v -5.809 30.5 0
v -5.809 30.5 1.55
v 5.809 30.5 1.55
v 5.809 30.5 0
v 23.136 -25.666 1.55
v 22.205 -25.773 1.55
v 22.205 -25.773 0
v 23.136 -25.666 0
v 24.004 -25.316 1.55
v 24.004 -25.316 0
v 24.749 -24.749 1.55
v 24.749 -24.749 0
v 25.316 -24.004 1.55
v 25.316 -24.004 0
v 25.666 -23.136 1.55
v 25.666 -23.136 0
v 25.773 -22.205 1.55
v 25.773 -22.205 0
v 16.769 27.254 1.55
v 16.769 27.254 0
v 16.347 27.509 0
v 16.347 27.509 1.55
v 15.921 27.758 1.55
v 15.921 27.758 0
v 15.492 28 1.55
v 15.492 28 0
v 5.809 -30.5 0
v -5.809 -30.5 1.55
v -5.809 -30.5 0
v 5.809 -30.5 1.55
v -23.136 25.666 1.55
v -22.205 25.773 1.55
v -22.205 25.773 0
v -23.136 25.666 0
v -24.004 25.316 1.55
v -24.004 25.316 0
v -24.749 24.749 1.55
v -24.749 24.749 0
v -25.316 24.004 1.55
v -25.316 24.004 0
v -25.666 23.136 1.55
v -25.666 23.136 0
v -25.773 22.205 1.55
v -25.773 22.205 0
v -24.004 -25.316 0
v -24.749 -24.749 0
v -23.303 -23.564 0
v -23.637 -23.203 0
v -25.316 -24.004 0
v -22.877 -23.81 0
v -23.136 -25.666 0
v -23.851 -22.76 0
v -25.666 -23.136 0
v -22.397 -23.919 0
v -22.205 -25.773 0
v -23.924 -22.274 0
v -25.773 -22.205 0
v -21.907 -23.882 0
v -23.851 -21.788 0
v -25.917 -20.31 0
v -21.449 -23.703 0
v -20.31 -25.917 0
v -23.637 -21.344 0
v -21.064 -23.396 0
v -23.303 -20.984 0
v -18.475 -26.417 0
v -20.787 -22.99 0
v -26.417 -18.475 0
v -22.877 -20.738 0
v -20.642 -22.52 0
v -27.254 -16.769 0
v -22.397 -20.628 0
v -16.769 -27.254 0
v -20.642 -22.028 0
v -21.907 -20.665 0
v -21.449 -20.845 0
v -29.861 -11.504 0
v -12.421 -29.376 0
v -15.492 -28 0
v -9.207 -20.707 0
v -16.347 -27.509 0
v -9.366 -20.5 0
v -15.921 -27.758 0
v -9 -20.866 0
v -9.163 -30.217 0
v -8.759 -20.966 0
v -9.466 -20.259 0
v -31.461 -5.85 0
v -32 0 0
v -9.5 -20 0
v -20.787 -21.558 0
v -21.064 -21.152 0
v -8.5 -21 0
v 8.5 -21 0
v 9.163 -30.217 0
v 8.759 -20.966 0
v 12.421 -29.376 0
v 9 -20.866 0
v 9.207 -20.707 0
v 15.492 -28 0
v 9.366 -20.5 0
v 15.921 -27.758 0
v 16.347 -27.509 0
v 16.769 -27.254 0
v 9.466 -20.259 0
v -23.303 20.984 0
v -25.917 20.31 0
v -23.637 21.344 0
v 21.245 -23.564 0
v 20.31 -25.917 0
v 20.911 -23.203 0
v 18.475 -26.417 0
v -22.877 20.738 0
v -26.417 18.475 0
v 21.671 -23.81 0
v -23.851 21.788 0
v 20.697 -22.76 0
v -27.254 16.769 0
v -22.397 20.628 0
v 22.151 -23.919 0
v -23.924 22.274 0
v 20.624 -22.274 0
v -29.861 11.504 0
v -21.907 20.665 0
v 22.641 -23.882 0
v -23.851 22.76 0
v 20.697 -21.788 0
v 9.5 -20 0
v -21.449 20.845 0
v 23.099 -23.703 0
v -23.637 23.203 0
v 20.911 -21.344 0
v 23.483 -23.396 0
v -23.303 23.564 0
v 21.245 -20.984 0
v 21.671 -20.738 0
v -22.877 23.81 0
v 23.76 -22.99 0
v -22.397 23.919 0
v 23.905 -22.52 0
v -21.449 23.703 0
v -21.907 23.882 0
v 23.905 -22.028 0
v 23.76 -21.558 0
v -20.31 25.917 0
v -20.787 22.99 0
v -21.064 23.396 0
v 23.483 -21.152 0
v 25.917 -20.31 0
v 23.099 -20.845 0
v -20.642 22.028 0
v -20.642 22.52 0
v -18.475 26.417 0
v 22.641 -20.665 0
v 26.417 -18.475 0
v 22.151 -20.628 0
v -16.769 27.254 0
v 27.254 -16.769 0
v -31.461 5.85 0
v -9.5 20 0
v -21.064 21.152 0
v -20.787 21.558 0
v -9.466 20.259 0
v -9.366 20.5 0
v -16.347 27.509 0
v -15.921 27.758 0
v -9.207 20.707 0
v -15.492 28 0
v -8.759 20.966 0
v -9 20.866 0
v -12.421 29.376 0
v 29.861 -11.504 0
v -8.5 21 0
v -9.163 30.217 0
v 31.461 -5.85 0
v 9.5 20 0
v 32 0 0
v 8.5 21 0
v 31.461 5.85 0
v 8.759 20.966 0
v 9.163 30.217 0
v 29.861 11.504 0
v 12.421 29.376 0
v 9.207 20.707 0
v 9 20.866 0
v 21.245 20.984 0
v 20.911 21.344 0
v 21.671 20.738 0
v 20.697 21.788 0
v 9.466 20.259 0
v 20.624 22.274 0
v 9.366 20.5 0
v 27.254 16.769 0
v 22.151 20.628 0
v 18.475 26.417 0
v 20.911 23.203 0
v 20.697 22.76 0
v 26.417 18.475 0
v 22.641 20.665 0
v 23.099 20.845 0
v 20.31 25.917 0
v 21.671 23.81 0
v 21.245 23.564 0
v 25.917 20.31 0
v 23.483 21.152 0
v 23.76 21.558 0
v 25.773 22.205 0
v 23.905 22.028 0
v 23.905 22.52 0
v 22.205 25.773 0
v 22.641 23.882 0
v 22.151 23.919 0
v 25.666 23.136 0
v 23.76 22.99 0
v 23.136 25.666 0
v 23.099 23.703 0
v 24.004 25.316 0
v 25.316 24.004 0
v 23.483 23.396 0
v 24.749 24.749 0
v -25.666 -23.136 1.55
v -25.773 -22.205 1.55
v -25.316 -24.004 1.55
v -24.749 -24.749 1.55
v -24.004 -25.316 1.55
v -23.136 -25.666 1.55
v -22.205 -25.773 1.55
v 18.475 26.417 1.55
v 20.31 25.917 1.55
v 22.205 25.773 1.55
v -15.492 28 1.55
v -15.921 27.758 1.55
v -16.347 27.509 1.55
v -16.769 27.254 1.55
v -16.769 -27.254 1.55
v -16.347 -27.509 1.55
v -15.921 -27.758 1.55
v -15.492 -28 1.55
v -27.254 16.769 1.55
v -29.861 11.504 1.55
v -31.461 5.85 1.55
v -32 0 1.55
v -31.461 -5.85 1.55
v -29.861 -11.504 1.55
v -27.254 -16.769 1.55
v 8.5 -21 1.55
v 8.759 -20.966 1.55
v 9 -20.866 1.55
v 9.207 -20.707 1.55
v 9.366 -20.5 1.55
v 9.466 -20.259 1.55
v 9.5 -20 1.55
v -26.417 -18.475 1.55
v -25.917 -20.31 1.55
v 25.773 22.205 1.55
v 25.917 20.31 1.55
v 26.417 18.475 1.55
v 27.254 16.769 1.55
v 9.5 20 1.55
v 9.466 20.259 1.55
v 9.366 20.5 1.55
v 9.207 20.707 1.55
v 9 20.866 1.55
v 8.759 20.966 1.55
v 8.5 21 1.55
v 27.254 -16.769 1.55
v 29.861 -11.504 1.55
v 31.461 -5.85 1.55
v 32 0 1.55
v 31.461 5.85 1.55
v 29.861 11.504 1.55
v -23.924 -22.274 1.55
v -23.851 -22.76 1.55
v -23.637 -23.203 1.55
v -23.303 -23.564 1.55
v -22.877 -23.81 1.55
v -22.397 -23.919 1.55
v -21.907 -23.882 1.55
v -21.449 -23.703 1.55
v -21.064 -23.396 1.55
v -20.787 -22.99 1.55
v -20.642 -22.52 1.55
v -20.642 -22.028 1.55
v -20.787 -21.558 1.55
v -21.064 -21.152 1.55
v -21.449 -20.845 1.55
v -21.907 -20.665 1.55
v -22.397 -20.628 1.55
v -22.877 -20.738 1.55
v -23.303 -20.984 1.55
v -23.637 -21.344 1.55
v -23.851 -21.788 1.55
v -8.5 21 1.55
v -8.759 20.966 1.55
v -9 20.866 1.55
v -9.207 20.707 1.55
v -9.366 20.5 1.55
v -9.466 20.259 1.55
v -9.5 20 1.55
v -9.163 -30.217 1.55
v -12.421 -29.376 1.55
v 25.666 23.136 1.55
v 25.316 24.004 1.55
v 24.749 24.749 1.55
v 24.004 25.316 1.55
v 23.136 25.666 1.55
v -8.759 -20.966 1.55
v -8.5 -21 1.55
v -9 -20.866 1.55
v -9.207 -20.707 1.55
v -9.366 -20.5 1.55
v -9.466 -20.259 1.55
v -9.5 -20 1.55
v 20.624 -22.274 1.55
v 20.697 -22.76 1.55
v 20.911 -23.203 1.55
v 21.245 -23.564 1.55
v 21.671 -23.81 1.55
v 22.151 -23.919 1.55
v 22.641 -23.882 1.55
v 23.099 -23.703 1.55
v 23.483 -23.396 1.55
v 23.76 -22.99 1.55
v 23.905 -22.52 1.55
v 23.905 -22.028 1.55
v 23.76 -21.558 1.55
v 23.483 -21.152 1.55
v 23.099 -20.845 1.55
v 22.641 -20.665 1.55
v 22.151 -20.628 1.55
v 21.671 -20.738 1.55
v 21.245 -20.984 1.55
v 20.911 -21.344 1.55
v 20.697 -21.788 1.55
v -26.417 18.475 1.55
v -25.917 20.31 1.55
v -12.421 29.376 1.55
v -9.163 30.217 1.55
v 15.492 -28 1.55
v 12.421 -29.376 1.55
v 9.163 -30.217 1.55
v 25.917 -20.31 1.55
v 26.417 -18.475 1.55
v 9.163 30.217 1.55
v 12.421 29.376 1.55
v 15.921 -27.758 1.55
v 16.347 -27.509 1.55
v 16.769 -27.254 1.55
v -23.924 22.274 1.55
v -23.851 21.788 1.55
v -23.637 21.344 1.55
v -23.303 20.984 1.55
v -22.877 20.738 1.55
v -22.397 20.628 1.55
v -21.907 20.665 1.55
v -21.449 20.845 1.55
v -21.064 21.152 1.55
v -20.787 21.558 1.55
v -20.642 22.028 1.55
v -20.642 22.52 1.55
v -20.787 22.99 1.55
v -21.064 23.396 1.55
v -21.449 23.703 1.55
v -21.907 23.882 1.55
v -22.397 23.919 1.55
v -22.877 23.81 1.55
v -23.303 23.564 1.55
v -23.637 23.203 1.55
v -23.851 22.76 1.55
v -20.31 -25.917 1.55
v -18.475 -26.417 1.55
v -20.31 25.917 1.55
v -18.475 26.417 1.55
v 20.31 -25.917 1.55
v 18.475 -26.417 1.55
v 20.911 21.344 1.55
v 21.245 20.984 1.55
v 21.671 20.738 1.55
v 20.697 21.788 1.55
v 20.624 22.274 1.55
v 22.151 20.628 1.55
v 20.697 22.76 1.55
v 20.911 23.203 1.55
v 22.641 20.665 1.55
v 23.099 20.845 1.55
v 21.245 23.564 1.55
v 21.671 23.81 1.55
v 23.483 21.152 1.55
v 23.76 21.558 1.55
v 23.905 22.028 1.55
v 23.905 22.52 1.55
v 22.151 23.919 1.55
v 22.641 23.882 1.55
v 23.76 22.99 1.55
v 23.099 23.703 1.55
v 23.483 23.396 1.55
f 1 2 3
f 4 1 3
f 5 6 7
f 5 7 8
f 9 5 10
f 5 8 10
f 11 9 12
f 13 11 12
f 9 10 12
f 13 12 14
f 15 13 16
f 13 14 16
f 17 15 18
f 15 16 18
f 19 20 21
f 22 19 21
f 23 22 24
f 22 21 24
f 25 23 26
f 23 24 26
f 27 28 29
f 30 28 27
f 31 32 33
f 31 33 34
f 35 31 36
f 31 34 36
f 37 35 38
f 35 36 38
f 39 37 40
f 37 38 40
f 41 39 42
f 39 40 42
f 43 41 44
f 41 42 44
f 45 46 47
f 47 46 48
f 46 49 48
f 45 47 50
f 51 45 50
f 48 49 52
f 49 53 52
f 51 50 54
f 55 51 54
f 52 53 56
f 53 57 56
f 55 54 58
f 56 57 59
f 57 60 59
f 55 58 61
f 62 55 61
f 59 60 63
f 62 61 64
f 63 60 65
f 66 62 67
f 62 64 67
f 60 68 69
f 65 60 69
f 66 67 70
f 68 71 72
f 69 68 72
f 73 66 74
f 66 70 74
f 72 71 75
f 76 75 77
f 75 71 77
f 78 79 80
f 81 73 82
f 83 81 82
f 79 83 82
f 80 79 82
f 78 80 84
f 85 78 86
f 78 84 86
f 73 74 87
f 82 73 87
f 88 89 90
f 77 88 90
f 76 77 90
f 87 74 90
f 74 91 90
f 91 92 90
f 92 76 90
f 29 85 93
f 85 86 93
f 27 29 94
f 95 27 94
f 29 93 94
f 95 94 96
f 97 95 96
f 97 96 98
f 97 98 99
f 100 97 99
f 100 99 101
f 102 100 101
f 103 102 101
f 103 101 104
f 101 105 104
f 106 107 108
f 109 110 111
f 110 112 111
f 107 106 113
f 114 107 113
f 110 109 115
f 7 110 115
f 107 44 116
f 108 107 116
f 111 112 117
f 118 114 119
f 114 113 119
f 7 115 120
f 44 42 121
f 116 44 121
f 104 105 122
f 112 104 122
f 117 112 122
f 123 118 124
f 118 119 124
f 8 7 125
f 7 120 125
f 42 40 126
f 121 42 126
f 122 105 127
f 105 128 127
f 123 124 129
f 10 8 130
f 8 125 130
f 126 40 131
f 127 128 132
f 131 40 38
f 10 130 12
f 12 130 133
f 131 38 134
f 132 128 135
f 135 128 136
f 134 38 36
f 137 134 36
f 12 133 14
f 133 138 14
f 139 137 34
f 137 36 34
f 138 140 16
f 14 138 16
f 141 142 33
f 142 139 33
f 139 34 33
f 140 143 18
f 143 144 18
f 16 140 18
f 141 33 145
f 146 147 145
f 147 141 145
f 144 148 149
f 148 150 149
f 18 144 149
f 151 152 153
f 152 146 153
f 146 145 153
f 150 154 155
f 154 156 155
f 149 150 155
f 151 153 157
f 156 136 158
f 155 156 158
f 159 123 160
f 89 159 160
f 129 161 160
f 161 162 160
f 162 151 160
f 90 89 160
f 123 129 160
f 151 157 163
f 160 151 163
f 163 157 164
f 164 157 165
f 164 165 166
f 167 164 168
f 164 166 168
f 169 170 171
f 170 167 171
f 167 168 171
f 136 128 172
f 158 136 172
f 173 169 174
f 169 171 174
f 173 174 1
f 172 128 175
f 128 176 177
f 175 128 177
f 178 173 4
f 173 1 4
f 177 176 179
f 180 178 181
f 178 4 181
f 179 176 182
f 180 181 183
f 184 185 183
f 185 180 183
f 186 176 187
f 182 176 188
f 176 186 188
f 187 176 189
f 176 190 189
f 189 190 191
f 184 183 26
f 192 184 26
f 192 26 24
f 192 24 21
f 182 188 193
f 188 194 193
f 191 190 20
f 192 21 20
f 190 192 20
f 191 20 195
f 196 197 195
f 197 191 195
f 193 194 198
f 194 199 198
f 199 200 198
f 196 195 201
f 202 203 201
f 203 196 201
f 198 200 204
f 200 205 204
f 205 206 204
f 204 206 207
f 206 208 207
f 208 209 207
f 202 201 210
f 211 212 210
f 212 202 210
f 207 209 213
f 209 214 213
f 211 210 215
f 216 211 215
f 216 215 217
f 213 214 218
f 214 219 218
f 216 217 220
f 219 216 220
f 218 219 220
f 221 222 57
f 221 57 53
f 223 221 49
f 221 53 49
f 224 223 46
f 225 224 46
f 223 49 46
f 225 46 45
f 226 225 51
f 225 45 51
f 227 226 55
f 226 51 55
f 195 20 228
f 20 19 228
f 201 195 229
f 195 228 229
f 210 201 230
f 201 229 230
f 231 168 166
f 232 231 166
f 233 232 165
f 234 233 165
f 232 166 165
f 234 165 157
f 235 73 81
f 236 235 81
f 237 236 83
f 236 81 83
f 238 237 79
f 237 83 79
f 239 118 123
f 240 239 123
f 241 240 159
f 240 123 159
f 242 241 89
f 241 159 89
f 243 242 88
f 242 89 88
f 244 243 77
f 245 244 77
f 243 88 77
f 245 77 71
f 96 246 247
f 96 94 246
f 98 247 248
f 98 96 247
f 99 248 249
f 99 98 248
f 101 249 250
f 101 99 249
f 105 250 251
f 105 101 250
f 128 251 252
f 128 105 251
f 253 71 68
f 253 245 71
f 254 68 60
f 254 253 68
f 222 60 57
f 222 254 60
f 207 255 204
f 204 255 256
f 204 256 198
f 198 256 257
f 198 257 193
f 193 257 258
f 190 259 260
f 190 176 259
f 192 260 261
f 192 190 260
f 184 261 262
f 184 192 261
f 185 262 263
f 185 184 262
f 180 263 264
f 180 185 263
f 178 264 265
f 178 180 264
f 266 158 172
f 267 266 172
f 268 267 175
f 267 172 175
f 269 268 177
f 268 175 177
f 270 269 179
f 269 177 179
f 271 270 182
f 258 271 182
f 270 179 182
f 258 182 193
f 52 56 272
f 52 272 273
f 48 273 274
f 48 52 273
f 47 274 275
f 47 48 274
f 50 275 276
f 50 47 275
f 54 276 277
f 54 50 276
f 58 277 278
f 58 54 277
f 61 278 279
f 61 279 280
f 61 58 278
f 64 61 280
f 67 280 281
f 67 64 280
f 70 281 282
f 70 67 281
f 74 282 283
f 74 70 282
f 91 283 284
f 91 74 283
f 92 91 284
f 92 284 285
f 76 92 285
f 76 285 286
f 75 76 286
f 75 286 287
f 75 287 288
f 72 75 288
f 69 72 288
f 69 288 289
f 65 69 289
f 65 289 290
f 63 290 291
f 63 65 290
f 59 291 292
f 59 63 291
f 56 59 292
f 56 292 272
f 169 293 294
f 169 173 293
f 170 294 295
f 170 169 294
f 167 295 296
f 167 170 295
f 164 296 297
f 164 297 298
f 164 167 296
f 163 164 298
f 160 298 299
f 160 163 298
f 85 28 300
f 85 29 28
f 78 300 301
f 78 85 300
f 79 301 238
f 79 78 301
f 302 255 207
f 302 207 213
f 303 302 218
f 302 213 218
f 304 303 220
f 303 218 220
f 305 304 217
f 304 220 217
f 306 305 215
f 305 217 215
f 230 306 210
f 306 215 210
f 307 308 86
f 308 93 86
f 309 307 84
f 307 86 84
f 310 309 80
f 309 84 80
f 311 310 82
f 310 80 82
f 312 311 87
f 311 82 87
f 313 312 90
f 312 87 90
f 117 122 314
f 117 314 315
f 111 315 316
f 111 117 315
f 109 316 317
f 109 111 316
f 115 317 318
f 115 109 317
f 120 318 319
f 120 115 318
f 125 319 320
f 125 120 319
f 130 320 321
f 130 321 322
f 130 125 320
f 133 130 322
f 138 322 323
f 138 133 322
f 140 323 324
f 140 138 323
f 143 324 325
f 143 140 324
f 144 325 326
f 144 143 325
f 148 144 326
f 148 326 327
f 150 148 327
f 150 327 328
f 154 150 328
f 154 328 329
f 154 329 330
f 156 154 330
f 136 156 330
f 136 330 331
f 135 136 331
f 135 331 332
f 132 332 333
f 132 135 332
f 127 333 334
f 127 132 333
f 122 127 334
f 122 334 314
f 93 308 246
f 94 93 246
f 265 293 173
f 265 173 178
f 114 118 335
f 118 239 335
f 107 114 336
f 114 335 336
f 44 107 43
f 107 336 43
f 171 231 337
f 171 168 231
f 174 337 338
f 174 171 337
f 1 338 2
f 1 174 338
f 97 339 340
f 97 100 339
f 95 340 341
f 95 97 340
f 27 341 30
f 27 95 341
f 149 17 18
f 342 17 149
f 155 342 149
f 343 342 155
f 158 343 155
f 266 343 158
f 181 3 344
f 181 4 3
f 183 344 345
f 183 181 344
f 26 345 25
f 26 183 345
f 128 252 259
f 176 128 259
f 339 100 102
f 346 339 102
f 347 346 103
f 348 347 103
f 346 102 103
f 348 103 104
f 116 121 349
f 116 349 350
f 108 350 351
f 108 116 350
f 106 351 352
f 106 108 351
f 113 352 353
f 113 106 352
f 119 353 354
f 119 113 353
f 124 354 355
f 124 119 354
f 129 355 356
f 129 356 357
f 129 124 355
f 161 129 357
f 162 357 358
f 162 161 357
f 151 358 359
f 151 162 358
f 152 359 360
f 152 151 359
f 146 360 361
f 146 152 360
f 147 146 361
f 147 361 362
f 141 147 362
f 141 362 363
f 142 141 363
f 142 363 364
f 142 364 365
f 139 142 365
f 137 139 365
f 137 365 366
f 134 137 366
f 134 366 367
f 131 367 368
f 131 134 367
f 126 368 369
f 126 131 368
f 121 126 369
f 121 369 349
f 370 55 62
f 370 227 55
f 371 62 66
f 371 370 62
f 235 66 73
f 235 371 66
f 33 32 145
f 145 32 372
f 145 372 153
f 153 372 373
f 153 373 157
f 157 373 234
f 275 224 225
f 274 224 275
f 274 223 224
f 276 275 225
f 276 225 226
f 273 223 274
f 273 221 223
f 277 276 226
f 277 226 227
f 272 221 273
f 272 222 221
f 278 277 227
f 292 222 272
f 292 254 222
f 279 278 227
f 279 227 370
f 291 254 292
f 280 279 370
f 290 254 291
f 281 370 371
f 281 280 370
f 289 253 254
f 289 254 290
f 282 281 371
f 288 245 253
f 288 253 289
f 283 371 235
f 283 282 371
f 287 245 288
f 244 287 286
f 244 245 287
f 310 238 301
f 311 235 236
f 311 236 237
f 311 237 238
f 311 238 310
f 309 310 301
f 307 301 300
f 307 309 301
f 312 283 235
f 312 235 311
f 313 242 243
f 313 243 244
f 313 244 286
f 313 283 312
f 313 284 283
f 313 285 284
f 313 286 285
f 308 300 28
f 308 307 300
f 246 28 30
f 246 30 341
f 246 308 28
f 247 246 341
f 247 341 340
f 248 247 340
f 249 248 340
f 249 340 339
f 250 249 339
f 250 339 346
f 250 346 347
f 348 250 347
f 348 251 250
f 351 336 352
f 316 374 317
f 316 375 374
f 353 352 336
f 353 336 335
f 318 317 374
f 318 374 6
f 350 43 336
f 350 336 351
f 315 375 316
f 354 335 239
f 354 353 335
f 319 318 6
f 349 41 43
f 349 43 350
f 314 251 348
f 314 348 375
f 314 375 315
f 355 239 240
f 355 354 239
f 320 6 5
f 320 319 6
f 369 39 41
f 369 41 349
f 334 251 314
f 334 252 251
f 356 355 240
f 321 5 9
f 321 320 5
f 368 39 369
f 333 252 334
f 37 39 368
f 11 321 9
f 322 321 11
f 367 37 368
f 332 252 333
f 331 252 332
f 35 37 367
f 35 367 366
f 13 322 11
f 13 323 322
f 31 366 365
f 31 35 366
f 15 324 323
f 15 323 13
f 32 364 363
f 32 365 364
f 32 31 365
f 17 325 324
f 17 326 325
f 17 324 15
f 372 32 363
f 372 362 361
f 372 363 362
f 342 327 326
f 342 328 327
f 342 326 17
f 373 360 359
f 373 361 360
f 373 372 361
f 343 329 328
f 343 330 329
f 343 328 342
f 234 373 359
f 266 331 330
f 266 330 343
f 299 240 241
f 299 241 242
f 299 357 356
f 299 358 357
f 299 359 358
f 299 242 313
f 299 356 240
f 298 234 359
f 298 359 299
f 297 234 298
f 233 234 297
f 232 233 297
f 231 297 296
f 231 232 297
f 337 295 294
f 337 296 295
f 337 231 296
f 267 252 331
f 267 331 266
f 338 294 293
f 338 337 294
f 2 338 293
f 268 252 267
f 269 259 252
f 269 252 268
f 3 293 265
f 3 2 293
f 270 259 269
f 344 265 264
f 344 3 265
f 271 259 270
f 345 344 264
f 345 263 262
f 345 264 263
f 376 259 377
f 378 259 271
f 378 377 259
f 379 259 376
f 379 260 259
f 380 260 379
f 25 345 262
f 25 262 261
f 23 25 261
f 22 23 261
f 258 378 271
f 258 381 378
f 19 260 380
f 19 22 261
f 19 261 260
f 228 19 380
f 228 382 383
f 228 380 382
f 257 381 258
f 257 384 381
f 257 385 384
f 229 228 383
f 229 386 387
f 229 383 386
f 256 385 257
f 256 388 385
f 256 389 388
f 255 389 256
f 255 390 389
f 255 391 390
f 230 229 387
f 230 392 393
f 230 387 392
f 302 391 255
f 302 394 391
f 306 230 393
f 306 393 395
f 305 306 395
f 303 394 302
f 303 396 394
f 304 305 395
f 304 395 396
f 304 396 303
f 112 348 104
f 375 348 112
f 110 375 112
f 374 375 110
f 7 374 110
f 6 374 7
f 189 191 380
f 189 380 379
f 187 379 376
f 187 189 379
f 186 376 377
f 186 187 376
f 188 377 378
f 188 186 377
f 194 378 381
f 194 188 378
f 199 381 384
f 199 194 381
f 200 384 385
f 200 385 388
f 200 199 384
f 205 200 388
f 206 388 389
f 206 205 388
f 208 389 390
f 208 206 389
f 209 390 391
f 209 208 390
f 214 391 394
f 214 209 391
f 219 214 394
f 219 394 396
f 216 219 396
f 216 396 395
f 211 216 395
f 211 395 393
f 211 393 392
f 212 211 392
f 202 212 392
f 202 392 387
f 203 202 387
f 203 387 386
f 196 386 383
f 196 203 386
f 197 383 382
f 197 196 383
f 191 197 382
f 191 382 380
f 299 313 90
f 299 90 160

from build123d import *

# Parameters (mm, degrees)
ESQUISSE1_R             = 1.65
BOSS_EXTRU_1_DEPTH      = 1.55
ESQUISSE2_W             = 19
ESQUISSE2_H             = 42
ENL_V_MAT_EXTRU_1_DEPTH = 46.281370341
CONG_1_R                = 10
CONG_2_R                = 1
ESQUISSE3_OUTSIDE_W     = 84.104
ESQUISSE3_OUTSIDE_H     = 84.104
ESQUISSE3_OUTSIDE_W_2   = 70
ESQUISSE3_OUTSIDE_H_2   = 61
ENL_V_MAT_EXTRU_2_DEPTH = 46.281370486
CONG_3_R                = 20


with BuildPart() as part:
    # Esquisse1 → Boss.-Extru.1 (new body)
    with BuildSketch(Plane.XY):
        with BuildLine():
            ThreePointArc((-24.957906965, 20.02755302), (-32, 0), (-24.957906965, -20.02755302))
            ThreePointArc((-24.957906965, -20.02755302), (-24.748737342, -24.748737342), (-20.02755302, -24.957906965))
            ThreePointArc((-20.02755302, -24.957906965), (0, -32), (20.02755302, -24.957906965))
            ThreePointArc((20.02755302, -24.957906965), (24.748737342, -24.748737342), (24.957906965, -20.02755302))
            ThreePointArc((24.957906965, -20.02755302), (32, 0), (24.957906965, 20.02755302))
            ThreePointArc((24.957906965, 20.02755302), (24.748737342, 24.748737342), (20.02755302, 24.957906965))
            ThreePointArc((20.02755302, 24.957906965), (0, 32), (-20.02755302, 24.957906965))
            ThreePointArc((-20.02755302, 24.957906965), (-24.748737342, 24.748737342), (-24.957906965, 20.02755302))
        make_face()
        with Locations(Location((-22.273863607, 22.273863607, 0), (0, 0, 180))):
            Circle(ESQUISSE1_R, mode=Mode.SUBTRACT)
        with Locations(Location((22.273863607, 22.273863607, 0), (0, 0, 180))):
            Circle(ESQUISSE1_R, mode=Mode.SUBTRACT)
        with Locations(Location((22.273863607, -22.273863607, 0), (0, 0, 180))):
            Circle(ESQUISSE1_R, mode=Mode.SUBTRACT)
        with Locations(Location((-22.273863607, -22.273863607, 0), (0, 0, 180))):
            Circle(ESQUISSE1_R, mode=Mode.SUBTRACT)
    extrude(amount=BOSS_EXTRU_1_DEPTH)

    # Esquisse2 → Enlèv. mat.-Extru.1 (cut, through all)
    with BuildSketch(Plane.XY.offset(1.55)):
        Rectangle(ESQUISSE2_W, ESQUISSE2_H)
    extrude(amount=-ENL_V_MAT_EXTRU_1_DEPTH, mode=Mode.SUBTRACT)

    # Congé1
    cong_1_edges = [part.edges().sort_by_distance(p)[0] for p in [
        (20.02755302, 24.957906965, 0.775),
        (24.957906965, 20.02755302, 0.775),
        (24.957906965, -20.02755302, 0.775),
        (20.02755302, -24.957906965, 0.775),
        (-20.02755302, -24.957906965, 0.775),
        (-24.957906965, -20.02755302, 0.775),
        (-24.957906965, 20.02755302, 0.775),
        (-20.02755302, 24.957906965, 0.775),
    ]]
    fillet(cong_1_edges, radius=CONG_1_R)

    # Congé2
    cong_2_edges = [part.edges().sort_by_distance(p)[0] for p in [
        (-9.5, -21, 0.775),
        (-9.5, 21, 0.775),
        (9.5, 21, 0.775),
        (9.5, -21, 0.775),
    ]]
    fillet(cong_2_edges, radius=CONG_2_R)

    # Esquisse3 outside → Enlèv. mat.-Extru.2 (cut, through all)
    with BuildSketch(Plane.XY.offset(1.55)):
        Rectangle(ESQUISSE3_OUTSIDE_W, ESQUISSE3_OUTSIDE_H)
        Rectangle(ESQUISSE3_OUTSIDE_W_2, ESQUISSE3_OUTSIDE_H_2, mode=Mode.SUBTRACT)
    extrude(amount=-ENL_V_MAT_EXTRU_2_DEPTH, mode=Mode.SUBTRACT)

    # Congé3
    cong_3_edges = [part.edges().sort_by_distance(p)[0] for p in [
        (9.682458366, -30.5, 0.775),
        (-9.682458366, -30.5, 0.775),
        (-9.682458366, 30.5, 0.775),
        (9.682458366, 30.5, 0.775),
    ]]
    fillet(cong_3_edges, radius=CONG_3_R)


solid = part.part
